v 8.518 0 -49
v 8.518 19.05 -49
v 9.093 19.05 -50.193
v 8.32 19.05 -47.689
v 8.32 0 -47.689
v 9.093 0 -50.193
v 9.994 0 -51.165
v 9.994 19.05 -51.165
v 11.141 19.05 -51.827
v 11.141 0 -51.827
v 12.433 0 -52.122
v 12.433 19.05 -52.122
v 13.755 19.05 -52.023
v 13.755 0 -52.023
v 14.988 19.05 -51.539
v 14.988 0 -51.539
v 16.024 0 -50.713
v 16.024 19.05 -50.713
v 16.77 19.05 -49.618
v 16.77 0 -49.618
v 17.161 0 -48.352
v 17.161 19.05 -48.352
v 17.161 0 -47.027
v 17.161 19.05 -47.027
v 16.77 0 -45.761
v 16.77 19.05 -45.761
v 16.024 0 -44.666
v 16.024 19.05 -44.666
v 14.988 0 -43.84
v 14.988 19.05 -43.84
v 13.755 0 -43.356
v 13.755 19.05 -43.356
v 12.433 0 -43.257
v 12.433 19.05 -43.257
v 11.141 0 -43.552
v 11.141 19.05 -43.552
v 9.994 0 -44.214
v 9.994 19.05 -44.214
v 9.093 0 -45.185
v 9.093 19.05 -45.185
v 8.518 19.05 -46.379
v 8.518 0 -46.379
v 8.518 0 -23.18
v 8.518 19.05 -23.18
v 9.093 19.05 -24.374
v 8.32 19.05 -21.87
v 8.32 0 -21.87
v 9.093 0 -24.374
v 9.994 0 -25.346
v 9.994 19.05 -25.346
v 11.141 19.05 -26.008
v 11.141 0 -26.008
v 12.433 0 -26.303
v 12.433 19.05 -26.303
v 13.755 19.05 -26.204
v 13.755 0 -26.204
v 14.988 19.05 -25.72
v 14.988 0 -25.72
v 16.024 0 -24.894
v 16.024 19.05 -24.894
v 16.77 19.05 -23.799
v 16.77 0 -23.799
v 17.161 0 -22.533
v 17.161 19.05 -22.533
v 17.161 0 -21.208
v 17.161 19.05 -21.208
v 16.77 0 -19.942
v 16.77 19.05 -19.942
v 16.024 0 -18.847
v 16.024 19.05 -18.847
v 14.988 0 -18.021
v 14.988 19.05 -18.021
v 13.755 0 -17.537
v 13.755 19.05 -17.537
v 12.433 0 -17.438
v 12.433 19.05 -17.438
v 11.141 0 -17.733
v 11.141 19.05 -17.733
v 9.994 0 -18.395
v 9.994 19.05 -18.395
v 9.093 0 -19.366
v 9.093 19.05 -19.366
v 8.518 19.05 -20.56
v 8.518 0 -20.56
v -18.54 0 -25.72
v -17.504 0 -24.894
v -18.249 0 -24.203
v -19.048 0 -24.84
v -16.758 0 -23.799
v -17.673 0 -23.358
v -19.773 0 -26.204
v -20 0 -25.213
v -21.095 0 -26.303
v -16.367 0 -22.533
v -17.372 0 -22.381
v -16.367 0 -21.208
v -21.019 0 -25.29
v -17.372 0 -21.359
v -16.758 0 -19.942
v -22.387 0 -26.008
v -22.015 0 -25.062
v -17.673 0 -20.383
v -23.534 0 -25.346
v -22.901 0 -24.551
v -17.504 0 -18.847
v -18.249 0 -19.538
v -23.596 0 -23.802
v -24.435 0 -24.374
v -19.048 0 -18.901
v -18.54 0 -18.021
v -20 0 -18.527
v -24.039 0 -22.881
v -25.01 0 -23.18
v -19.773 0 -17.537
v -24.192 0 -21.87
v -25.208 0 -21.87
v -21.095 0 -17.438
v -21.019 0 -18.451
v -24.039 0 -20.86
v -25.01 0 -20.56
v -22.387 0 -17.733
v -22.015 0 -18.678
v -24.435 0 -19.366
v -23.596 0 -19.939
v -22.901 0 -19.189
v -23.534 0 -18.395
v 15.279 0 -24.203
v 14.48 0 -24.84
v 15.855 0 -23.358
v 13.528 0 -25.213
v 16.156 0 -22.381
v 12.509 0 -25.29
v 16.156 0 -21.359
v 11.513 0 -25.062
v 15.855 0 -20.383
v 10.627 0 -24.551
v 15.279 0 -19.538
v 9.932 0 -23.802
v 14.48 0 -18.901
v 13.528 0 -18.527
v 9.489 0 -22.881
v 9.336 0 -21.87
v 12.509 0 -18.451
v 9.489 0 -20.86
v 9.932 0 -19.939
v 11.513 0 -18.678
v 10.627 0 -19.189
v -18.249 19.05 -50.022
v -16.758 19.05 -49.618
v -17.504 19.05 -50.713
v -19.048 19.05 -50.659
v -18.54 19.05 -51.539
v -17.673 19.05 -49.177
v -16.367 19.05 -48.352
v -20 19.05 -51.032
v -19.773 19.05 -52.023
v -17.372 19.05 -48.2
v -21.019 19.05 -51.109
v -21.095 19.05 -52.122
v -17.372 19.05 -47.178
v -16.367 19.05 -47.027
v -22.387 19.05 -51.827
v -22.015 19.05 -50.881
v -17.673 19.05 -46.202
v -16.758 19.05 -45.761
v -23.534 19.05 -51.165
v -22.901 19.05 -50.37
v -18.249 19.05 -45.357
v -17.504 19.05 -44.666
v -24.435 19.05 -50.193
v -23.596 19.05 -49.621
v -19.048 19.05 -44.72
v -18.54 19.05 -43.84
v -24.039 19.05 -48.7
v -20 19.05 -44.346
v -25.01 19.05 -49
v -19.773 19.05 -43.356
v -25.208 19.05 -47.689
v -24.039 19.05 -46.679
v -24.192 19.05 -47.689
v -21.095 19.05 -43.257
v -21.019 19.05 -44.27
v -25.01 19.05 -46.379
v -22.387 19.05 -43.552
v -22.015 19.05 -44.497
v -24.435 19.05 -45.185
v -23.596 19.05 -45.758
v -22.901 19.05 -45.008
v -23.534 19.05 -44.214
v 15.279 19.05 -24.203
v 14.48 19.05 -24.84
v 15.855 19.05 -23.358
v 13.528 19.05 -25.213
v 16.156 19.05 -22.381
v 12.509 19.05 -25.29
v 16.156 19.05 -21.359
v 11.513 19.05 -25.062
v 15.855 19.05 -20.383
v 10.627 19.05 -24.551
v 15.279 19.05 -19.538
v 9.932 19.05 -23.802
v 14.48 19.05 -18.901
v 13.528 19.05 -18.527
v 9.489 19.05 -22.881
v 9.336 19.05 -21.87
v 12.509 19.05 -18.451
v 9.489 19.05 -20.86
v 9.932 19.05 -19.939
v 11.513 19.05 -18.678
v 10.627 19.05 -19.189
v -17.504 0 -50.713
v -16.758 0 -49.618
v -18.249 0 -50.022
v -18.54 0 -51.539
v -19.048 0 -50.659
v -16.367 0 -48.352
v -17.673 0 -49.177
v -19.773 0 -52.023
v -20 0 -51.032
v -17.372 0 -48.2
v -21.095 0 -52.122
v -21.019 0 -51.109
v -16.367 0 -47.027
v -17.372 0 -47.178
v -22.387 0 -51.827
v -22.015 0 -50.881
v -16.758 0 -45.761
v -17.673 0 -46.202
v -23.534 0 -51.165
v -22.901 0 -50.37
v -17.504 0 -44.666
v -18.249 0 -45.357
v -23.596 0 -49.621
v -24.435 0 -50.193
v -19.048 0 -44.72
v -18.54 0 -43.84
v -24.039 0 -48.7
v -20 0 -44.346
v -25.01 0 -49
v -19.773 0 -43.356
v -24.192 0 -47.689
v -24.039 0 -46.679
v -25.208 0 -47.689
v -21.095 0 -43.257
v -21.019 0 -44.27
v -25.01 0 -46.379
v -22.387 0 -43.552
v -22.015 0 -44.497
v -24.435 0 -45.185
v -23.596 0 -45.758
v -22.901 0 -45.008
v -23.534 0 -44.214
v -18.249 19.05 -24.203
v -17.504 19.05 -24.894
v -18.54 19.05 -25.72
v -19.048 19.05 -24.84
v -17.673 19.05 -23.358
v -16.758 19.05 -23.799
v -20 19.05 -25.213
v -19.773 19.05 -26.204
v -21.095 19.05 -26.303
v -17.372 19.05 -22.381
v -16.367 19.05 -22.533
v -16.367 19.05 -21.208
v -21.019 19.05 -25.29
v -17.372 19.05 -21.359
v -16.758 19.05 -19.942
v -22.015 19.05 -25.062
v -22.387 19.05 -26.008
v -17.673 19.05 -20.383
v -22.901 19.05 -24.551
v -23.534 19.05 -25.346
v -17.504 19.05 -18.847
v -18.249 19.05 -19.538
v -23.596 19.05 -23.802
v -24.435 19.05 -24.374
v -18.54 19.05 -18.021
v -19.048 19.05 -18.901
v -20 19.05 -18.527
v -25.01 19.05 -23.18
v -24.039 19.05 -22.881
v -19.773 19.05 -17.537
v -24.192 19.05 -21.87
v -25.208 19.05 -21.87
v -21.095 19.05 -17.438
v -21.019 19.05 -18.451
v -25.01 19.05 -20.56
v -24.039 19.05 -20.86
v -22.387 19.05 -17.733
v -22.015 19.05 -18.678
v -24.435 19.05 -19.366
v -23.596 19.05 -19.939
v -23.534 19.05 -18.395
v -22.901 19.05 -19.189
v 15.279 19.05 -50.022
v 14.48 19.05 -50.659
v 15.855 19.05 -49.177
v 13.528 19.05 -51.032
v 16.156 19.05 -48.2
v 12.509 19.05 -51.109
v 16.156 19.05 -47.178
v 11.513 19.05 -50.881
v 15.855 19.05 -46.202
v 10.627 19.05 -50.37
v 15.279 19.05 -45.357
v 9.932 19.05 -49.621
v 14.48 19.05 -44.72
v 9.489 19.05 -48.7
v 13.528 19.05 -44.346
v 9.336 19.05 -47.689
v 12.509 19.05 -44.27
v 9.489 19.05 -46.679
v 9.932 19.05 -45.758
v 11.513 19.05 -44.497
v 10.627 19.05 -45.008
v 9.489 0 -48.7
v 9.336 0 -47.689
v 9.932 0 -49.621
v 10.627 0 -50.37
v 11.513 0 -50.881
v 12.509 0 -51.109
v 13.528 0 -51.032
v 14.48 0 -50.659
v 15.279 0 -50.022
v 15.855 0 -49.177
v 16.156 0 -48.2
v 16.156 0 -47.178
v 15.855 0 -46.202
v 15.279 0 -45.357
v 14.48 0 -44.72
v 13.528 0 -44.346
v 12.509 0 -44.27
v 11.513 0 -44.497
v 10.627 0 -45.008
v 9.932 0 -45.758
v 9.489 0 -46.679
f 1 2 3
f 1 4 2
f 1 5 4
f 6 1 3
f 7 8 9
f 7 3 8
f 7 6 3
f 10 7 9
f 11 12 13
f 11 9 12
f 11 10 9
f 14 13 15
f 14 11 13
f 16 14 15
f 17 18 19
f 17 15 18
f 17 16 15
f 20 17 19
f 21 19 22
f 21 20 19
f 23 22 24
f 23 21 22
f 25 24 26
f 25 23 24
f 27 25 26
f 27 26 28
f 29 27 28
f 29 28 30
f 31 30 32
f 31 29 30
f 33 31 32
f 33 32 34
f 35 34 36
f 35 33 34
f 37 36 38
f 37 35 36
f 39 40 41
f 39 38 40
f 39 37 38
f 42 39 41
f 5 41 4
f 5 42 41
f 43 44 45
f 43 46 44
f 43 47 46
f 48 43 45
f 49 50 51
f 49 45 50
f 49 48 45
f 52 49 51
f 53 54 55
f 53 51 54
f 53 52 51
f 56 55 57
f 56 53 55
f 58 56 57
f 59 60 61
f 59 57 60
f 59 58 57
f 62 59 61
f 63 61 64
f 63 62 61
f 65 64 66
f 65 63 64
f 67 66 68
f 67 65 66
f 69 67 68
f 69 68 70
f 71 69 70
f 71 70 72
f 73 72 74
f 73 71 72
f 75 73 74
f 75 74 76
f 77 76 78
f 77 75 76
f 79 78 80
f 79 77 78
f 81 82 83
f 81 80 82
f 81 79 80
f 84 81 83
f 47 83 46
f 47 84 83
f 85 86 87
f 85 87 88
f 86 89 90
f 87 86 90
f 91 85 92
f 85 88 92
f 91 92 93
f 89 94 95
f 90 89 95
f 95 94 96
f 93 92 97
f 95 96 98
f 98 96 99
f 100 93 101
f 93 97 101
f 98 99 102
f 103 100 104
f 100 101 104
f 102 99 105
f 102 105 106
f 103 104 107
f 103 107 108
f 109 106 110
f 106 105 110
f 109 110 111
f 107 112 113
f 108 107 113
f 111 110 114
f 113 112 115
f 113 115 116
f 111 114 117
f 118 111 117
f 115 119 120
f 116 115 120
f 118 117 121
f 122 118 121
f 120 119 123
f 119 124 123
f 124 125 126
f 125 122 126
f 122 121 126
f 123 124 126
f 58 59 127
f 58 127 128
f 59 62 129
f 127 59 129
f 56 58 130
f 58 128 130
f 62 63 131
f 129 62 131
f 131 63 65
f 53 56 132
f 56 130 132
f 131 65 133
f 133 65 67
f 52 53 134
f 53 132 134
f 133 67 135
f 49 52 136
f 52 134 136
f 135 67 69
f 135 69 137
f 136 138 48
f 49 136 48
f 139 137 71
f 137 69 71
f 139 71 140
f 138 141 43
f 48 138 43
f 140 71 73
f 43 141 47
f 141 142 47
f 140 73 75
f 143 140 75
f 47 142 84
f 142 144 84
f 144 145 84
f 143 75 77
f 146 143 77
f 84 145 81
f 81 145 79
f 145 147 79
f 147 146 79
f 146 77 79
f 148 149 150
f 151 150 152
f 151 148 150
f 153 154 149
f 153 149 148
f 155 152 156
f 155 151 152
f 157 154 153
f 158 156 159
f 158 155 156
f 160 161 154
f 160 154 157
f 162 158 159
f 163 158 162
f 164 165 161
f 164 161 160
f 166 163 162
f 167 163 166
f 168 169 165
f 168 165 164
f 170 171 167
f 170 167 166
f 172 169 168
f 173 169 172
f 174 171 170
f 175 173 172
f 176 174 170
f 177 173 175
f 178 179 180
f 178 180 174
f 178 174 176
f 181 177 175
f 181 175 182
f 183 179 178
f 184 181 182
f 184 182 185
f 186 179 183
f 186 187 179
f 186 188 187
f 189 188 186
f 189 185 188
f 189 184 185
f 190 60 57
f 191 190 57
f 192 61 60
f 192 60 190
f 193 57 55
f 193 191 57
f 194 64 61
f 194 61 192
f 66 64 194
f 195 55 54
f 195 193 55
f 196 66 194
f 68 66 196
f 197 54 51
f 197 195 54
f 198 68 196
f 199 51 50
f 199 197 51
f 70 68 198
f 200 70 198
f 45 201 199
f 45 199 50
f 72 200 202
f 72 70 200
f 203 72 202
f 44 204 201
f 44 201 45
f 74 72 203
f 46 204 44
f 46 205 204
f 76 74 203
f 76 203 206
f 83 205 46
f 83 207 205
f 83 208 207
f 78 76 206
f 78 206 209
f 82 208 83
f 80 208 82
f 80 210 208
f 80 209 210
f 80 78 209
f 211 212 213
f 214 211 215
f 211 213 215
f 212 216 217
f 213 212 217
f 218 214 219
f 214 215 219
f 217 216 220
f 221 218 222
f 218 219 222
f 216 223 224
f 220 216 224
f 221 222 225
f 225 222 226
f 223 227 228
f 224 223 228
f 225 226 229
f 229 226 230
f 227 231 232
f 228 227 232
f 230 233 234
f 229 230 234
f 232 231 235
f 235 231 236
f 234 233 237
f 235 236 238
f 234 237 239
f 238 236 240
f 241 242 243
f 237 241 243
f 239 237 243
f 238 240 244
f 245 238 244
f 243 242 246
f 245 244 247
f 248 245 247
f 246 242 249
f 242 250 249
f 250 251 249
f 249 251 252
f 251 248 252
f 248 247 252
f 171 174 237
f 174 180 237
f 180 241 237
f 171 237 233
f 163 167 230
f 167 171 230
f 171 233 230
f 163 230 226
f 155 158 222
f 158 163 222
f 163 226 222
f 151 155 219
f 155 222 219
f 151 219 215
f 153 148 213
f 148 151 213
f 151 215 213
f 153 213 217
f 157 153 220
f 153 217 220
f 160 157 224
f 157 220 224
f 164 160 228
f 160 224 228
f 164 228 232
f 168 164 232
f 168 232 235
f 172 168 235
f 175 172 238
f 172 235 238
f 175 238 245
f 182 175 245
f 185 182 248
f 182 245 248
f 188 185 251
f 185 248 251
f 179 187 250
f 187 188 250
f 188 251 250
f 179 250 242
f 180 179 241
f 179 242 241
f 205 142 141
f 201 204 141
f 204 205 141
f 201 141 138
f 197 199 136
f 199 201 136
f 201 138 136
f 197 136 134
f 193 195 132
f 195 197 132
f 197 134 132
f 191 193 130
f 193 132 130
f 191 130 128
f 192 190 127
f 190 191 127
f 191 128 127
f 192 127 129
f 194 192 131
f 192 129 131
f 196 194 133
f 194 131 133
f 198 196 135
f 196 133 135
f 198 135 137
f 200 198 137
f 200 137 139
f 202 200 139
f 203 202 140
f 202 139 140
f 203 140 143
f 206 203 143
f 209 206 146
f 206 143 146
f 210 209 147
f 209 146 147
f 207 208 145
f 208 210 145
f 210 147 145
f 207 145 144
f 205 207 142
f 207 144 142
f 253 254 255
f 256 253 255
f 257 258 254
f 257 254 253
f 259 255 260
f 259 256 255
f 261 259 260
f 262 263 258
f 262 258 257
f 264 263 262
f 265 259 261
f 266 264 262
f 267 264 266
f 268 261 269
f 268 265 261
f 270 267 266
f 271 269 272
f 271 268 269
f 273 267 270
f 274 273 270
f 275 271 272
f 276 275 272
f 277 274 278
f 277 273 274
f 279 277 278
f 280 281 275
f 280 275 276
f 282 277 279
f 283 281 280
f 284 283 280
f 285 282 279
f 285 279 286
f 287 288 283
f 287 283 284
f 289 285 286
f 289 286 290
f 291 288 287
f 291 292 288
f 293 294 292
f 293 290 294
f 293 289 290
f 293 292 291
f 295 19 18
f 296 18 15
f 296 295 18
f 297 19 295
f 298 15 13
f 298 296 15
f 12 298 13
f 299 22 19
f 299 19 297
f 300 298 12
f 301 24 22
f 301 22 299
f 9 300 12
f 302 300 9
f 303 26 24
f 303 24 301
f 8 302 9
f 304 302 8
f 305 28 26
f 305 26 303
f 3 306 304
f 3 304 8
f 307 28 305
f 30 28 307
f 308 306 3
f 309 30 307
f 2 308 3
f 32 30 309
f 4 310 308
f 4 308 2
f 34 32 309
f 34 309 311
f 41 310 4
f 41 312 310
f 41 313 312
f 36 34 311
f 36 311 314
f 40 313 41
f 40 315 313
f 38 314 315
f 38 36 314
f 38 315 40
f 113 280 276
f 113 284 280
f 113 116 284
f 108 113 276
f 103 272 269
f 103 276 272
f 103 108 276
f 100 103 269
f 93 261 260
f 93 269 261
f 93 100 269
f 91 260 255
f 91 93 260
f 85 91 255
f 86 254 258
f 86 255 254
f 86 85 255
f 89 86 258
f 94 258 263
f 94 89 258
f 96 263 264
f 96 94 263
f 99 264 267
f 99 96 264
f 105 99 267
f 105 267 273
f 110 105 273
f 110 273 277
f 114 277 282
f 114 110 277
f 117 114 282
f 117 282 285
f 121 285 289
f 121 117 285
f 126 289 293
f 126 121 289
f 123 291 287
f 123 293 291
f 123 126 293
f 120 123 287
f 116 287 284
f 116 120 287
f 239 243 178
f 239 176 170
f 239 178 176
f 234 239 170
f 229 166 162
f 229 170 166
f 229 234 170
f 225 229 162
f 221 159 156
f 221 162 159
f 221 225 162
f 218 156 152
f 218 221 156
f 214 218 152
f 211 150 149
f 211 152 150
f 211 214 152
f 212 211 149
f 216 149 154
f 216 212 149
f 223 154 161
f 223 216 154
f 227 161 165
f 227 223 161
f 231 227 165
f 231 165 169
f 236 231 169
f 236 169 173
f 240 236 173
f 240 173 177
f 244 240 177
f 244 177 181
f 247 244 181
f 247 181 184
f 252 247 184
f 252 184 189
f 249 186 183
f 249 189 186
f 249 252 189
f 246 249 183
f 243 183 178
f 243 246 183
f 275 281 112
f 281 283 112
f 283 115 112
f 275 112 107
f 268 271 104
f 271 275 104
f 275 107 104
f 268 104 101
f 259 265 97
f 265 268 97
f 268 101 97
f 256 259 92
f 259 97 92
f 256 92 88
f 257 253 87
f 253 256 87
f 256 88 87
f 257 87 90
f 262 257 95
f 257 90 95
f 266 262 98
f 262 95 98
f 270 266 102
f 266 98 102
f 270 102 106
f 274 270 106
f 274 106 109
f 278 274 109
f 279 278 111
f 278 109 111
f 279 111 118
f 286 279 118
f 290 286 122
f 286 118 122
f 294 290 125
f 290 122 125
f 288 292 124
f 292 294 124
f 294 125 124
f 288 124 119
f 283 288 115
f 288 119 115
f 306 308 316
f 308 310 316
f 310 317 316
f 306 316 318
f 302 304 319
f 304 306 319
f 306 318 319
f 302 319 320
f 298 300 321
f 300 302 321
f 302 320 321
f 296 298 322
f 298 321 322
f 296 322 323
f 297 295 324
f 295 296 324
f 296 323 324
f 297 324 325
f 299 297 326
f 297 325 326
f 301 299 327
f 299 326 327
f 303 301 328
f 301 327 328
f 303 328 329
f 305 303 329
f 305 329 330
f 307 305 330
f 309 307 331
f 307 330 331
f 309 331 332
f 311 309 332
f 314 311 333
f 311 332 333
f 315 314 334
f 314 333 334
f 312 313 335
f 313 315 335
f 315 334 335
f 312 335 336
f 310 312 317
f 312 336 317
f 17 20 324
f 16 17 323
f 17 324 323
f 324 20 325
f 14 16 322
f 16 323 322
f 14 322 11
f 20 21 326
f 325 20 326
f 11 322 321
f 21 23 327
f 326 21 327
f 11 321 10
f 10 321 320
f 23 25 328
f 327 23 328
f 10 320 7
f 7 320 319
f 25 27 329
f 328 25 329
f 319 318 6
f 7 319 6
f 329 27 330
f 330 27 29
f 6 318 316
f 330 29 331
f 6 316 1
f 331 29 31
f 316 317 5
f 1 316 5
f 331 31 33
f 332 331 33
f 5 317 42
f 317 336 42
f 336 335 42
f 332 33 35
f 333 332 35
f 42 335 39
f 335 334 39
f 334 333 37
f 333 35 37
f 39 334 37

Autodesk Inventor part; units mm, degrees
ref_plane "YZ Plane" through (0, 0, 0) normal (1, 0, 0) x (0, 1, 0)
ref_plane "XZ Plane" through (0, 0, 0) normal (0, 1, 0) x (-1, 0, 0)
ref_plane "XY Plane" through (0, 0, 0) normal (0, 0, 1) x (1, 0, 0)
sketch "Sketch1" plane through (0, 0, 0) normal (0, 1, 0) x (-1, 0, 0)
  arc A0 (17.7231, -22.7881) -> (17.7231, -20.9526) centre (20.7626, -21.8703) ccw projected
  arc A1 (17.7231, -20.9526) -> (17.7231, -22.7881) centre (20.7626, -21.8703) ccw projected
  arc A2 (17.7231, -48.6072) -> (17.7231, -46.7717) centre (20.7626, -47.6894) ccw projected
  arc A3 (17.7231, -46.7717) -> (17.7231, -48.6072) centre (20.7626, -47.6894) ccw projected
  arc A4 (-9.726, -46.7717) -> (-9.726, -48.6072) centre (-12.7654, -47.6894) ccw projected
  arc A5 (-9.726, -48.6072) -> (-9.726, -46.7717) centre (-12.7654, -47.6894) ccw projected
  arc A6 (-9.726, -20.9526) -> (-9.726, -22.7881) centre (-12.7654, -21.8703) ccw projected
  arc A7 (-9.726, -22.7881) -> (-9.726, -20.9526) centre (-12.7654, -21.8703) ccw projected
  circle A8 centre (20.7626, -21.8703) radius 3.429
  circle A9 centre (20.7626, -47.6894) radius 3.429
  circle A10 centre (-12.7654, -47.6894) radius 3.429
  circle A11 centre (-12.7654, -21.8703) radius 3.429
  circle A12 centre (-12.7654, -21.8703) radius 4.445
  circle A13 centre (-12.7654, -47.6894) radius 4.445
  circle A14 centre (20.7626, -47.6894) radius 4.445
  circle A15 centre (20.7626, -21.8703) radius 4.445
  point P0 (0, 0)
  dimension "d0" = 6.858
  dimension "d1" = 6.858
  dimension "d2" = 6.858
  dimension "d3" = 6.858
  dimension "d4" = 8.89
  dimension "d5" = 8.89
  dimension "d6" = 8.89
  dimension "d7" = 8.89
extrude "Extrusion1" add sketch "Sketch1" along normal blind 19.05 contours A12 | A13 | A14 | A15
ref_plane "Work Plane2" through (-20.7626, 0, -17.4253) normal (0, 0, 1) x (1, 0, 0)
ref_plane "Work Plane1" through (-4.353, 20.3962, -73.6634) normal (0, 0, 1) x (1, 0, 0)
sketch "Sketch2" plane through (-20.7626, 0, -17.4253) normal (0, 0, 1) x (1, 0, 0)
  circle A0 centre (16.4095, 20.3962) radius 7.9375 projected
  line L0 (29.718, 19.05) -> (28.448, 19.05) projected
  line L1 (29.083, 0) -> (29.083, 19.05) projected
  line L2 (29.718, 19.05) -> (37.0078, 19.05) projected
  circle A1 centre (16.4095, 20.3962) radius 69.85 projected
  circle A2 centre (16.4095, 20.3962) radius 7.9375 projected
  line L3 (29.3635, 19.05) -> (28.0935, 19.05) projected
  line L4 (28.0935, 22.098) -> (28.0935, 19.05) projected
  line L5 (26.8235, 20.5954) -> (28.0935, 19.1092) projected
  line L6 (22.3384, 25.8441) -> (26.8235, 20.5954) projected
  arc A3 (22.3384, 25.8441) -> (21.3729, 26.289) centre (21.3729, 25.019) ccw projected
  line L7 (4.7255, 19.05) -> (3.4555, 19.05) projected
  line L8 (4.445, 0) -> (4.445, 19.05) projected
  line L9 (4.7255, 19.1092) -> (5.9955, 20.5954) projected
  arc A4 (12.3827, 29.337) -> (7.5552, 27.1123) centre (12.3827, 22.987) ccw projected
  line L10 (7.5552, 27.1123) -> (3.6505, 22.5429) projected
  arc A5 (2.685, 22.098) -> (3.6505, 22.5429) centre (2.685, 23.368) ccw projected
  line L11 (5.9955, 22.098) -> (2.685, 22.098) projected
  line L12 (5.9955, 20.5954) -> (5.9955, 22.098) projected
  line L13 (5.9955, 20.5954) -> (10.4807, 25.8441) projected
  arc A6 (11.4462, 26.289) -> (10.4807, 25.8441) centre (11.4462, 25.019) ccw projected
  line L14 (11.4462, 26.289) -> (21.3729, 26.289) projected
  arc A7 (22.3384, 25.8441) -> (21.3729, 26.289) centre (21.3729, 25.019) ccw projected
  line L15 (22.3384, 25.8441) -> (26.8235, 20.5954) projected
  line L16 (26.8235, 22.098) -> (26.8235, 20.5954) projected
  line L17 (30.1341, 22.098) -> (26.8235, 22.098) projected
  arc A8 (29.1686, 22.5429) -> (30.1341, 22.098) centre (30.1341, 23.368) ccw projected
  line L18 (29.1686, 22.5429) -> (25.2639, 27.1123) projected
  arc A9 (25.2639, 27.1123) -> (20.4364, 29.337) centre (20.4364, 22.987) ccw projected
  line L19 (12.3827, 29.337) -> (20.4364, 29.337) projected
  line L20 (4.445, 19.05) -> (8.255, 19.05)
  line L21 (16.4095, 12.4587) -> (16.4095, 8.6487)
  arc A10 (8.3294, 19.05) -> (24.4897, 19.05) centre (16.4095, 20.3962) ccw
  line L22 (8.255, 19.05) -> (8.3294, 19.05)
  line L23 (24.4897, 19.05) -> (29.494, 19.05)
  line L24 (29.494, 16.51) -> (26.4127, 16.51)
  line L25 (6.4064, 16.51) -> (4.445, 16.51)
  line L26 (21.3729, 10.8814) -> (29.083, 3.1713)
  line L27 (21.3729, 10.8814) -> (34.2329, 10.8814) construction
  line L28 (23.3424, 12.2047) -> (29.083, 6.4641)
  line L29 (23.3424, 12.2047) -> (31.4608, 12.2047) construction
  line L30 (29.083, 6.4641) -> (29.083, 3.1713)
  line L31 (28.829, 6.3589) -> (23.3263, 11.8616)
  arc A11 (21.7932, 10.8203) -> (23.3263, 11.8616) centre (16.4095, 20.3962) ccw
  line L32 (28.829, 3.7845) -> (28.829, 6.3589)
  line L33 (23.3263, 11.8616) -> (23.3263, 9.2872)
  line L34 (23.3263, 9.2872) -> (25.9007, 9.2872)
  line L35 (25.9007, 9.2872) -> (25.9007, 6.7128)
  line L36 (25.9007, 6.7128) -> (28.475, 6.7128)
  line L37 (28.475, 6.7128) -> (28.475, 4.1385)
  arc A12 (23.3424, 12.2047) -> (26.4127, 16.51) centre (16.4095, 20.3962) ccw
  arc A13 (23.3263, 12.1911) -> (23.3424, 12.2047) centre (16.4095, 20.3962) ccw
  line L38 (37.973, 0) -> (29.083, 0) projected
  line L39 (4.445, 0) -> (29.083, 0)
  line L40 (16.4095, -95.1738) -> (16.4095, 135.9662)
  line L41 (29.083, 2.54) -> (29.083, 0)
  line L42 (4.445, 2.54) -> (4.445, 0)
  line L43 (30.099, 19.05) -> (30.099, 0) projected
  line L44 (28.829, 2.286) -> (4.699, 2.286)
  line L45 (4.699, 2.286) -> (4.699, 0.254)
  line L46 (4.699, 0.254) -> (28.829, 0.254)
  line L47 (28.829, 0.254) -> (28.829, 2.286)
  line L48 (28.221, 4.3925) -> (28.221, 6.4588)
  line L49 (28.221, 6.4588) -> (26.1547, 6.4588)
  line L50 (23.0723, 9.5412) -> (23.0723, 11.6618)
  line L51 (25.6467, 9.0332) -> (23.5803, 9.0332)
  line L52 (25.6467, 6.9668) -> (25.6467, 9.0332)
  line L53 (28.475, 4.1385) -> (28.829, 3.7845)
  line L54 (26.1547, 6.4588) -> (28.221, 4.3925)
  line L55 (21.7932, 10.8203) -> (23.0723, 9.5412)
  line L56 (23.5803, 9.0332) -> (25.6467, 6.9668)
  line L57 (4.699, 0.254) -> (6.731, 2.286)
  line L58 (4.699, 0.254) -> (7.5727, 0.254) construction
  line L59 (6.731, 2.286) -> (6.731, 0.254)
  line L60 (6.731, 0.254) -> (8.763, 2.286)
  line L61 (8.763, 0.254) -> (8.763, 2.286)
  line L62 (8.763, 0.254) -> (10.795, 2.286)
  line L63 (10.795, 2.286) -> (10.795, 0.254)
  line L64 (10.795, 0.254) -> (12.827, 2.286)
  line L65 (12.827, 2.286) -> (12.827, 0.254)
  line L66 (12.827, 0.254) -> (14.859, 2.286)
  line L67 (14.859, 2.286) -> (14.859, 0.254)
  line L68 (14.859, 0.254) -> (16.4095, 2.286)
  line L69 (28.1201, 0.254) -> (26.0881, 2.286)
  line L70 (26.0881, 2.286) -> (26.0881, 0.254)
  line L71 (26.0881, 0.254) -> (24.0561, 2.286)
  line L72 (24.0561, 0.254) -> (24.0561, 2.286)
  line L73 (24.0561, 0.254) -> (22.0241, 2.286)
  line L74 (22.0241, 2.286) -> (22.0241, 0.254)
  line L75 (22.0241, 0.254) -> (19.9921, 2.286)
  line L76 (19.9921, 2.286) -> (19.9921, 0.254)
  line L77 (19.9921, 0.254) -> (17.9601, 2.286)
  line L78 (17.9601, 2.286) -> (17.9601, 0.254)
  line L79 (17.9601, 0.254) -> (16.4095, 2.286)
  line L80 (23.8021, 0.8672) -> (22.3833, 2.286)
  line L81 (21.7701, 2.286) -> (21.7701, 0.8672)
  line L82 (21.7701, 0.8672) -> (20.3513, 2.286)
  line L83 (19.7381, 2.286) -> (19.7381, 0.8672)
  line L84 (19.7381, 0.8672) -> (18.3193, 2.286)
  line L85 (17.7061, 2.286) -> (17.7061, 1.0056)
  line L86 (17.7061, 1.0056) -> (16.729, 2.286)
  line L87 (16.09, 2.286) -> (15.113, 1.0056)
  line L88 (15.113, 1.0056) -> (15.113, 2.286)
  line L89 (14.4998, 2.286) -> (13.081, 0.8672)
  line L90 (13.081, 0.8672) -> (13.081, 2.286)
  line L91 (12.4678, 2.286) -> (11.049, 0.8672)
  line L92 (11.049, 0.8672) -> (11.049, 2.286)
  line L93 (10.4358, 2.286) -> (9.017, 0.8672)
  line L94 (9.017, 0.8672) -> (9.017, 2.286)
  line L95 (8.4038, 2.286) -> (6.985, 0.8672)
  line L96 (6.985, 0.8672) -> (6.985, 2.286)
  line L97 (6.3718, 2.286) -> (4.699, 0.6132)
  line L98 (28.2997, 0.4336) -> (28.4793, 0.254)
  line L99 (23.8021, 2.286) -> (23.8021, 0.8672)
  line L100 (25.8341, 0.8672) -> (24.4153, 2.286)
  line L101 (25.8341, 2.286) -> (25.8341, 0.8672)
  line L102 (28.2997, 0.4336) -> (26.4473, 2.286)
  line L103 (11.4462, 10.8814) -> (3.7361, 3.1713)
  line L104 (11.4462, 10.8814) -> (-1.4138, 10.8814) construction
  line L105 (9.4767, 12.2047) -> (3.7361, 6.4641)
  line L106 (3.9901, 6.3589) -> (9.4928, 11.8616)
  arc A14 (9.4928, 11.8616) -> (11.0259, 10.8203) centre (16.4095, 20.3962) ccw
  line L107 (3.9901, 3.7845) -> (3.9901, 6.3589)
  line L108 (9.4928, 11.8616) -> (9.4928, 9.2872)
  line L109 (9.4928, 9.2872) -> (6.9184, 9.2872)
  line L110 (6.9184, 9.2872) -> (6.9184, 6.7128)
  line L111 (6.9184, 6.7128) -> (4.344, 6.7128)
  line L112 (4.344, 6.7128) -> (4.344, 4.1385)
  line L113 (4.598, 4.3925) -> (4.598, 6.4588)
  line L114 (4.598, 6.4588) -> (6.6644, 6.4588)
  line L115 (9.7468, 9.5412) -> (9.7468, 11.6618)
  line L116 (7.1724, 9.0332) -> (9.2388, 9.0332)
  line L117 (7.1724, 6.9668) -> (7.1724, 9.0332)
  line L118 (4.344, 4.1385) -> (3.9901, 3.7845)
  line L119 (6.6644, 6.4588) -> (4.598, 4.3925)
  line L120 (11.0259, 10.8203) -> (9.7468, 9.5412)
  line L121 (9.2388, 9.0332) -> (7.1724, 6.9668)
  arc A15 (6.4064, 16.51) -> (9.4767, 12.2047) centre (16.4095, 20.3962) ccw
  arc A16 (11.4462, 10.8814) -> (21.3729, 10.8814) centre (16.4095, 20.3962) ccw
  line L122 (15.113, 2.286) -> (15.113, 9.7433)
  line L123 (17.7061, 2.54) -> (17.7061, 9.7433)
  line L124 (16.6635, 2.794) -> (17.4521, 3.5825)
  line L125 (17.4521, 3.8365) -> (16.6635, 3.8365)
  line L126 (16.6635, 4.0905) -> (17.4521, 4.8791)
  line L127 (17.4521, 5.1331) -> (16.6635, 5.1331)
  line L128 (16.6635, 5.3871) -> (17.4521, 6.1756)
  line L129 (17.4521, 6.4296) -> (16.6635, 6.4296)
  line L130 (16.6635, 6.6836) -> (17.4521, 7.4721)
  line L131 (17.4521, 7.7261) -> (16.6635, 7.7261)
  line L132 (16.6635, 7.9801) -> (17.4521, 8.7687)
  line L133 (17.4521, 9.0227) -> (16.6635, 9.0227)
  line L134 (16.6635, 9.2767) -> (17.072, 9.6852)
  line L135 (16.6635, 2.54) -> (17.4521, 2.54)
  line L136 (17.4521, 9.7433) -> (17.4521, 2.54)
  line L137 (16.6635, 2.54) -> (16.6635, 135.9662)
  line L138 (16.6635, -95.1738) -> (16.6635, -49.4533)
  line L139 (17.7061, 2.54) -> (29.083, 2.54)
  line L140 (4.445, 2.54) -> (16.4095, 2.54)
  line L141 (16.6635, 2.54) -> (17.4521, 2.54)
  line L142 (16.6962, 9.6685) -> (16.6635, 9.6359)
  line L143 (16.6635, 8.7687) -> (17.0929, 8.7687)
  line L144 (17.0929, 8.7687) -> (16.6635, 8.3394)
  line L145 (17.0929, 7.4721) -> (16.6635, 7.0428)
  line L146 (16.6635, 6.1756) -> (17.0929, 6.1756)
  line L147 (17.0929, 6.1756) -> (16.6635, 5.7463)
  line L148 (16.6635, 4.8791) -> (17.0929, 4.8791)
  line L149 (16.6635, 3.5825) -> (17.0929, 3.5825)
  line L150 (17.0929, 3.5825) -> (16.6635, 3.1532)
  line L151 (17.0929, 4.8791) -> (16.6635, 4.4497)
  line L152 (16.6635, 7.4721) -> (17.0929, 7.4721)
  line L153 (15.113, 2.54) -> (15.113, 9.7433)
  line L154 (16.1555, 2.794) -> (15.367, 3.5825)
  line L155 (15.367, 3.8365) -> (16.1555, 3.8365)
  line L156 (16.1555, 4.0905) -> (15.367, 4.8791)
  line L157 (15.367, 5.1331) -> (16.1555, 5.1331)
  line L158 (16.1555, 5.3871) -> (15.367, 6.1756)
  line L159 (15.367, 6.4296) -> (16.1555, 6.4296)
  line L160 (16.1555, 6.6836) -> (15.367, 7.4721)
  line L161 (15.367, 7.7261) -> (16.1555, 7.7261)
  line L162 (16.1555, 7.9801) -> (15.367, 8.7687)
  line L163 (15.367, 9.0227) -> (16.1555, 9.0227)
  line L164 (16.1555, 9.2767) -> (15.747, 9.6852)
  line L165 (16.1555, 2.54) -> (15.367, 2.54)
  line L166 (15.367, 9.7433) -> (15.367, 2.54)
  line L167 (16.1555, 2.54) -> (16.1555, 135.9662)
  line L168 (16.1555, 8.7687) -> (15.7262, 8.7687)
  line L169 (15.7262, 8.7687) -> (16.1555, 8.3394)
  line L170 (15.7262, 7.4721) -> (16.1555, 7.0428)
  line L171 (16.1555, 6.1756) -> (15.7262, 6.1756)
  line L172 (15.7262, 6.1756) -> (16.1555, 5.7463)
  line L173 (16.1555, 4.8791) -> (15.7262, 4.8791)
  line L174 (16.1555, 3.5825) -> (15.7262, 3.5825)
  line L175 (15.7262, 3.5825) -> (16.1555, 3.1532)
  line L176 (15.7262, 4.8791) -> (16.1555, 4.4497)
  line L177 (16.1555, 7.4721) -> (15.7262, 7.4721)
  line L178 (21.7932, 10.8203) -> (28.829, 3.7845)
  arc A17 (21.3729, 10.8814) -> (23.3263, 12.1911) centre (16.4095, 20.3962) ccw
  arc A18 (9.4767, 12.2047) -> (11.4462, 10.8814) centre (16.4095, 20.3962) ccw
  line L179 (3.7361, 6.4641) -> (3.7361, 3.1713)
  line L180 (3.7361, 3.1713) -> (3.7361, 6.4641)
  line L181 (3.7361, 6.4641) -> (3.7361, 3.1713)
  line L182 (16.4086, 29.337) -> (16.4086, -46.863)
  point P0 (20.7626, 0)
  dimension "d10" = 3.81
  dimension "d11" = 3.81
  dimension "d12" = 0.254
  dimension "d14" = 45
  dimension "d15" = 45
  dimension "d16" = 0.254
  dimension "d20" = 0.254
  dimension "d21" = 45
  dimension "d23" = 0.254
  dimension "d26" = 8.0538
  dimension "d27" = 76.2
  dimension "d28" = 4.0259
properties part number "FastenerForLegFrame"
